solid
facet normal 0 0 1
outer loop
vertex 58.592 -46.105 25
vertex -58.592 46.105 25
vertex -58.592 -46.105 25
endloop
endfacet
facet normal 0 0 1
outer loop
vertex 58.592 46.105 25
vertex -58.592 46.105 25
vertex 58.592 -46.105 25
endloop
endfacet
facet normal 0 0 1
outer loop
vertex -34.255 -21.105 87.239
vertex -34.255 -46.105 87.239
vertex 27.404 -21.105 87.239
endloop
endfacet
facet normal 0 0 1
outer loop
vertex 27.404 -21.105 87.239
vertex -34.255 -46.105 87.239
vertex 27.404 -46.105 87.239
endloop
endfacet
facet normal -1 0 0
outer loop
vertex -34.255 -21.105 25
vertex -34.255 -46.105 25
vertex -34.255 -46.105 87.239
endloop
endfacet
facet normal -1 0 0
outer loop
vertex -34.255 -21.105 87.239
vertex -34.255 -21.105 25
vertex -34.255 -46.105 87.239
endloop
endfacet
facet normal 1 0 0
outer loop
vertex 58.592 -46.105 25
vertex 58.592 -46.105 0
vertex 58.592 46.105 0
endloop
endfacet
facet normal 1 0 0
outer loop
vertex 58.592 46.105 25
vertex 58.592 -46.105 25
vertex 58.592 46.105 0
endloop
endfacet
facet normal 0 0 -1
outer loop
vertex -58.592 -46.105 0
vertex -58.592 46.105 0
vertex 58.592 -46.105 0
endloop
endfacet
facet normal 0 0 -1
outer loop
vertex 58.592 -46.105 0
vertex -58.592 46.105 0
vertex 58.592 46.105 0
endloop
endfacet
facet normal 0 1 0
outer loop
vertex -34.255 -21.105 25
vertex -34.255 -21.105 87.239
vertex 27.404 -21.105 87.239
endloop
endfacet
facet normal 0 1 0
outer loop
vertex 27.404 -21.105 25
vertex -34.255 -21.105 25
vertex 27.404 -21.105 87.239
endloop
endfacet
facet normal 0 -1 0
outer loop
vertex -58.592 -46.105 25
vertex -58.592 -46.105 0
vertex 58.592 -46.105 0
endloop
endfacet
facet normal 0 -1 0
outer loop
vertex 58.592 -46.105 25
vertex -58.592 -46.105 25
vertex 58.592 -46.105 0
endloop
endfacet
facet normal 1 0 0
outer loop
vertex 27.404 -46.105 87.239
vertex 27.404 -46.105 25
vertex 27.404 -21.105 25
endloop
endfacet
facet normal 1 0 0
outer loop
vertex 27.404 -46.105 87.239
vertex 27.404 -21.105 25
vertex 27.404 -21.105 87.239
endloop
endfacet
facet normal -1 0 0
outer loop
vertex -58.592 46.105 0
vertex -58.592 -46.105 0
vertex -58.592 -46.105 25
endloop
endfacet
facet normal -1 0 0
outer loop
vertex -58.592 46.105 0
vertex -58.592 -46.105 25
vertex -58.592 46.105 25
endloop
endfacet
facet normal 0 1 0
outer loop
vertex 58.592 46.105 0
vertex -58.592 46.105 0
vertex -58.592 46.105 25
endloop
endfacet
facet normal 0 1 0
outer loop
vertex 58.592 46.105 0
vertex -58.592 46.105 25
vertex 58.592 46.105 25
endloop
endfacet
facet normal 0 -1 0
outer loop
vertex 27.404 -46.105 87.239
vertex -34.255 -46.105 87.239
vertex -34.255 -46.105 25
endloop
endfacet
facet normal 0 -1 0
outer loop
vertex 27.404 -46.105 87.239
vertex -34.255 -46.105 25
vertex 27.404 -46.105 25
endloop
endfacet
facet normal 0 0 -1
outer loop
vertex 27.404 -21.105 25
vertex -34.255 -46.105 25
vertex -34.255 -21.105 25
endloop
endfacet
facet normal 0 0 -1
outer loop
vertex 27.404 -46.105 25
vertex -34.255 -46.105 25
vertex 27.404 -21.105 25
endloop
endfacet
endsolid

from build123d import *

# Parameters (mm, degrees)
F0_W     = 117.18414
F0_H     = 92.210472
F1_DEPTH = 25
F2_W     = 61.659556
F2_H     = 62.238863
F3_DEPTH = 25


with BuildPart() as f1:
    # F0 (on Top) → F1 (new body)
    with BuildSketch(Plane.XY):
        Rectangle(F0_W, F0_H)
    extrude(amount=F1_DEPTH)


with BuildPart() as f3:
    # F2 (on face) → F3 (new body)
    with BuildSketch(Plane.XZ.offset(46.105236)):
        with Locations((-3.425533, 56.119431)):
            Rectangle(F2_W, F2_H)
    extrude(amount=-F3_DEPTH)


solid = Compound([f1.part, f3.part])
